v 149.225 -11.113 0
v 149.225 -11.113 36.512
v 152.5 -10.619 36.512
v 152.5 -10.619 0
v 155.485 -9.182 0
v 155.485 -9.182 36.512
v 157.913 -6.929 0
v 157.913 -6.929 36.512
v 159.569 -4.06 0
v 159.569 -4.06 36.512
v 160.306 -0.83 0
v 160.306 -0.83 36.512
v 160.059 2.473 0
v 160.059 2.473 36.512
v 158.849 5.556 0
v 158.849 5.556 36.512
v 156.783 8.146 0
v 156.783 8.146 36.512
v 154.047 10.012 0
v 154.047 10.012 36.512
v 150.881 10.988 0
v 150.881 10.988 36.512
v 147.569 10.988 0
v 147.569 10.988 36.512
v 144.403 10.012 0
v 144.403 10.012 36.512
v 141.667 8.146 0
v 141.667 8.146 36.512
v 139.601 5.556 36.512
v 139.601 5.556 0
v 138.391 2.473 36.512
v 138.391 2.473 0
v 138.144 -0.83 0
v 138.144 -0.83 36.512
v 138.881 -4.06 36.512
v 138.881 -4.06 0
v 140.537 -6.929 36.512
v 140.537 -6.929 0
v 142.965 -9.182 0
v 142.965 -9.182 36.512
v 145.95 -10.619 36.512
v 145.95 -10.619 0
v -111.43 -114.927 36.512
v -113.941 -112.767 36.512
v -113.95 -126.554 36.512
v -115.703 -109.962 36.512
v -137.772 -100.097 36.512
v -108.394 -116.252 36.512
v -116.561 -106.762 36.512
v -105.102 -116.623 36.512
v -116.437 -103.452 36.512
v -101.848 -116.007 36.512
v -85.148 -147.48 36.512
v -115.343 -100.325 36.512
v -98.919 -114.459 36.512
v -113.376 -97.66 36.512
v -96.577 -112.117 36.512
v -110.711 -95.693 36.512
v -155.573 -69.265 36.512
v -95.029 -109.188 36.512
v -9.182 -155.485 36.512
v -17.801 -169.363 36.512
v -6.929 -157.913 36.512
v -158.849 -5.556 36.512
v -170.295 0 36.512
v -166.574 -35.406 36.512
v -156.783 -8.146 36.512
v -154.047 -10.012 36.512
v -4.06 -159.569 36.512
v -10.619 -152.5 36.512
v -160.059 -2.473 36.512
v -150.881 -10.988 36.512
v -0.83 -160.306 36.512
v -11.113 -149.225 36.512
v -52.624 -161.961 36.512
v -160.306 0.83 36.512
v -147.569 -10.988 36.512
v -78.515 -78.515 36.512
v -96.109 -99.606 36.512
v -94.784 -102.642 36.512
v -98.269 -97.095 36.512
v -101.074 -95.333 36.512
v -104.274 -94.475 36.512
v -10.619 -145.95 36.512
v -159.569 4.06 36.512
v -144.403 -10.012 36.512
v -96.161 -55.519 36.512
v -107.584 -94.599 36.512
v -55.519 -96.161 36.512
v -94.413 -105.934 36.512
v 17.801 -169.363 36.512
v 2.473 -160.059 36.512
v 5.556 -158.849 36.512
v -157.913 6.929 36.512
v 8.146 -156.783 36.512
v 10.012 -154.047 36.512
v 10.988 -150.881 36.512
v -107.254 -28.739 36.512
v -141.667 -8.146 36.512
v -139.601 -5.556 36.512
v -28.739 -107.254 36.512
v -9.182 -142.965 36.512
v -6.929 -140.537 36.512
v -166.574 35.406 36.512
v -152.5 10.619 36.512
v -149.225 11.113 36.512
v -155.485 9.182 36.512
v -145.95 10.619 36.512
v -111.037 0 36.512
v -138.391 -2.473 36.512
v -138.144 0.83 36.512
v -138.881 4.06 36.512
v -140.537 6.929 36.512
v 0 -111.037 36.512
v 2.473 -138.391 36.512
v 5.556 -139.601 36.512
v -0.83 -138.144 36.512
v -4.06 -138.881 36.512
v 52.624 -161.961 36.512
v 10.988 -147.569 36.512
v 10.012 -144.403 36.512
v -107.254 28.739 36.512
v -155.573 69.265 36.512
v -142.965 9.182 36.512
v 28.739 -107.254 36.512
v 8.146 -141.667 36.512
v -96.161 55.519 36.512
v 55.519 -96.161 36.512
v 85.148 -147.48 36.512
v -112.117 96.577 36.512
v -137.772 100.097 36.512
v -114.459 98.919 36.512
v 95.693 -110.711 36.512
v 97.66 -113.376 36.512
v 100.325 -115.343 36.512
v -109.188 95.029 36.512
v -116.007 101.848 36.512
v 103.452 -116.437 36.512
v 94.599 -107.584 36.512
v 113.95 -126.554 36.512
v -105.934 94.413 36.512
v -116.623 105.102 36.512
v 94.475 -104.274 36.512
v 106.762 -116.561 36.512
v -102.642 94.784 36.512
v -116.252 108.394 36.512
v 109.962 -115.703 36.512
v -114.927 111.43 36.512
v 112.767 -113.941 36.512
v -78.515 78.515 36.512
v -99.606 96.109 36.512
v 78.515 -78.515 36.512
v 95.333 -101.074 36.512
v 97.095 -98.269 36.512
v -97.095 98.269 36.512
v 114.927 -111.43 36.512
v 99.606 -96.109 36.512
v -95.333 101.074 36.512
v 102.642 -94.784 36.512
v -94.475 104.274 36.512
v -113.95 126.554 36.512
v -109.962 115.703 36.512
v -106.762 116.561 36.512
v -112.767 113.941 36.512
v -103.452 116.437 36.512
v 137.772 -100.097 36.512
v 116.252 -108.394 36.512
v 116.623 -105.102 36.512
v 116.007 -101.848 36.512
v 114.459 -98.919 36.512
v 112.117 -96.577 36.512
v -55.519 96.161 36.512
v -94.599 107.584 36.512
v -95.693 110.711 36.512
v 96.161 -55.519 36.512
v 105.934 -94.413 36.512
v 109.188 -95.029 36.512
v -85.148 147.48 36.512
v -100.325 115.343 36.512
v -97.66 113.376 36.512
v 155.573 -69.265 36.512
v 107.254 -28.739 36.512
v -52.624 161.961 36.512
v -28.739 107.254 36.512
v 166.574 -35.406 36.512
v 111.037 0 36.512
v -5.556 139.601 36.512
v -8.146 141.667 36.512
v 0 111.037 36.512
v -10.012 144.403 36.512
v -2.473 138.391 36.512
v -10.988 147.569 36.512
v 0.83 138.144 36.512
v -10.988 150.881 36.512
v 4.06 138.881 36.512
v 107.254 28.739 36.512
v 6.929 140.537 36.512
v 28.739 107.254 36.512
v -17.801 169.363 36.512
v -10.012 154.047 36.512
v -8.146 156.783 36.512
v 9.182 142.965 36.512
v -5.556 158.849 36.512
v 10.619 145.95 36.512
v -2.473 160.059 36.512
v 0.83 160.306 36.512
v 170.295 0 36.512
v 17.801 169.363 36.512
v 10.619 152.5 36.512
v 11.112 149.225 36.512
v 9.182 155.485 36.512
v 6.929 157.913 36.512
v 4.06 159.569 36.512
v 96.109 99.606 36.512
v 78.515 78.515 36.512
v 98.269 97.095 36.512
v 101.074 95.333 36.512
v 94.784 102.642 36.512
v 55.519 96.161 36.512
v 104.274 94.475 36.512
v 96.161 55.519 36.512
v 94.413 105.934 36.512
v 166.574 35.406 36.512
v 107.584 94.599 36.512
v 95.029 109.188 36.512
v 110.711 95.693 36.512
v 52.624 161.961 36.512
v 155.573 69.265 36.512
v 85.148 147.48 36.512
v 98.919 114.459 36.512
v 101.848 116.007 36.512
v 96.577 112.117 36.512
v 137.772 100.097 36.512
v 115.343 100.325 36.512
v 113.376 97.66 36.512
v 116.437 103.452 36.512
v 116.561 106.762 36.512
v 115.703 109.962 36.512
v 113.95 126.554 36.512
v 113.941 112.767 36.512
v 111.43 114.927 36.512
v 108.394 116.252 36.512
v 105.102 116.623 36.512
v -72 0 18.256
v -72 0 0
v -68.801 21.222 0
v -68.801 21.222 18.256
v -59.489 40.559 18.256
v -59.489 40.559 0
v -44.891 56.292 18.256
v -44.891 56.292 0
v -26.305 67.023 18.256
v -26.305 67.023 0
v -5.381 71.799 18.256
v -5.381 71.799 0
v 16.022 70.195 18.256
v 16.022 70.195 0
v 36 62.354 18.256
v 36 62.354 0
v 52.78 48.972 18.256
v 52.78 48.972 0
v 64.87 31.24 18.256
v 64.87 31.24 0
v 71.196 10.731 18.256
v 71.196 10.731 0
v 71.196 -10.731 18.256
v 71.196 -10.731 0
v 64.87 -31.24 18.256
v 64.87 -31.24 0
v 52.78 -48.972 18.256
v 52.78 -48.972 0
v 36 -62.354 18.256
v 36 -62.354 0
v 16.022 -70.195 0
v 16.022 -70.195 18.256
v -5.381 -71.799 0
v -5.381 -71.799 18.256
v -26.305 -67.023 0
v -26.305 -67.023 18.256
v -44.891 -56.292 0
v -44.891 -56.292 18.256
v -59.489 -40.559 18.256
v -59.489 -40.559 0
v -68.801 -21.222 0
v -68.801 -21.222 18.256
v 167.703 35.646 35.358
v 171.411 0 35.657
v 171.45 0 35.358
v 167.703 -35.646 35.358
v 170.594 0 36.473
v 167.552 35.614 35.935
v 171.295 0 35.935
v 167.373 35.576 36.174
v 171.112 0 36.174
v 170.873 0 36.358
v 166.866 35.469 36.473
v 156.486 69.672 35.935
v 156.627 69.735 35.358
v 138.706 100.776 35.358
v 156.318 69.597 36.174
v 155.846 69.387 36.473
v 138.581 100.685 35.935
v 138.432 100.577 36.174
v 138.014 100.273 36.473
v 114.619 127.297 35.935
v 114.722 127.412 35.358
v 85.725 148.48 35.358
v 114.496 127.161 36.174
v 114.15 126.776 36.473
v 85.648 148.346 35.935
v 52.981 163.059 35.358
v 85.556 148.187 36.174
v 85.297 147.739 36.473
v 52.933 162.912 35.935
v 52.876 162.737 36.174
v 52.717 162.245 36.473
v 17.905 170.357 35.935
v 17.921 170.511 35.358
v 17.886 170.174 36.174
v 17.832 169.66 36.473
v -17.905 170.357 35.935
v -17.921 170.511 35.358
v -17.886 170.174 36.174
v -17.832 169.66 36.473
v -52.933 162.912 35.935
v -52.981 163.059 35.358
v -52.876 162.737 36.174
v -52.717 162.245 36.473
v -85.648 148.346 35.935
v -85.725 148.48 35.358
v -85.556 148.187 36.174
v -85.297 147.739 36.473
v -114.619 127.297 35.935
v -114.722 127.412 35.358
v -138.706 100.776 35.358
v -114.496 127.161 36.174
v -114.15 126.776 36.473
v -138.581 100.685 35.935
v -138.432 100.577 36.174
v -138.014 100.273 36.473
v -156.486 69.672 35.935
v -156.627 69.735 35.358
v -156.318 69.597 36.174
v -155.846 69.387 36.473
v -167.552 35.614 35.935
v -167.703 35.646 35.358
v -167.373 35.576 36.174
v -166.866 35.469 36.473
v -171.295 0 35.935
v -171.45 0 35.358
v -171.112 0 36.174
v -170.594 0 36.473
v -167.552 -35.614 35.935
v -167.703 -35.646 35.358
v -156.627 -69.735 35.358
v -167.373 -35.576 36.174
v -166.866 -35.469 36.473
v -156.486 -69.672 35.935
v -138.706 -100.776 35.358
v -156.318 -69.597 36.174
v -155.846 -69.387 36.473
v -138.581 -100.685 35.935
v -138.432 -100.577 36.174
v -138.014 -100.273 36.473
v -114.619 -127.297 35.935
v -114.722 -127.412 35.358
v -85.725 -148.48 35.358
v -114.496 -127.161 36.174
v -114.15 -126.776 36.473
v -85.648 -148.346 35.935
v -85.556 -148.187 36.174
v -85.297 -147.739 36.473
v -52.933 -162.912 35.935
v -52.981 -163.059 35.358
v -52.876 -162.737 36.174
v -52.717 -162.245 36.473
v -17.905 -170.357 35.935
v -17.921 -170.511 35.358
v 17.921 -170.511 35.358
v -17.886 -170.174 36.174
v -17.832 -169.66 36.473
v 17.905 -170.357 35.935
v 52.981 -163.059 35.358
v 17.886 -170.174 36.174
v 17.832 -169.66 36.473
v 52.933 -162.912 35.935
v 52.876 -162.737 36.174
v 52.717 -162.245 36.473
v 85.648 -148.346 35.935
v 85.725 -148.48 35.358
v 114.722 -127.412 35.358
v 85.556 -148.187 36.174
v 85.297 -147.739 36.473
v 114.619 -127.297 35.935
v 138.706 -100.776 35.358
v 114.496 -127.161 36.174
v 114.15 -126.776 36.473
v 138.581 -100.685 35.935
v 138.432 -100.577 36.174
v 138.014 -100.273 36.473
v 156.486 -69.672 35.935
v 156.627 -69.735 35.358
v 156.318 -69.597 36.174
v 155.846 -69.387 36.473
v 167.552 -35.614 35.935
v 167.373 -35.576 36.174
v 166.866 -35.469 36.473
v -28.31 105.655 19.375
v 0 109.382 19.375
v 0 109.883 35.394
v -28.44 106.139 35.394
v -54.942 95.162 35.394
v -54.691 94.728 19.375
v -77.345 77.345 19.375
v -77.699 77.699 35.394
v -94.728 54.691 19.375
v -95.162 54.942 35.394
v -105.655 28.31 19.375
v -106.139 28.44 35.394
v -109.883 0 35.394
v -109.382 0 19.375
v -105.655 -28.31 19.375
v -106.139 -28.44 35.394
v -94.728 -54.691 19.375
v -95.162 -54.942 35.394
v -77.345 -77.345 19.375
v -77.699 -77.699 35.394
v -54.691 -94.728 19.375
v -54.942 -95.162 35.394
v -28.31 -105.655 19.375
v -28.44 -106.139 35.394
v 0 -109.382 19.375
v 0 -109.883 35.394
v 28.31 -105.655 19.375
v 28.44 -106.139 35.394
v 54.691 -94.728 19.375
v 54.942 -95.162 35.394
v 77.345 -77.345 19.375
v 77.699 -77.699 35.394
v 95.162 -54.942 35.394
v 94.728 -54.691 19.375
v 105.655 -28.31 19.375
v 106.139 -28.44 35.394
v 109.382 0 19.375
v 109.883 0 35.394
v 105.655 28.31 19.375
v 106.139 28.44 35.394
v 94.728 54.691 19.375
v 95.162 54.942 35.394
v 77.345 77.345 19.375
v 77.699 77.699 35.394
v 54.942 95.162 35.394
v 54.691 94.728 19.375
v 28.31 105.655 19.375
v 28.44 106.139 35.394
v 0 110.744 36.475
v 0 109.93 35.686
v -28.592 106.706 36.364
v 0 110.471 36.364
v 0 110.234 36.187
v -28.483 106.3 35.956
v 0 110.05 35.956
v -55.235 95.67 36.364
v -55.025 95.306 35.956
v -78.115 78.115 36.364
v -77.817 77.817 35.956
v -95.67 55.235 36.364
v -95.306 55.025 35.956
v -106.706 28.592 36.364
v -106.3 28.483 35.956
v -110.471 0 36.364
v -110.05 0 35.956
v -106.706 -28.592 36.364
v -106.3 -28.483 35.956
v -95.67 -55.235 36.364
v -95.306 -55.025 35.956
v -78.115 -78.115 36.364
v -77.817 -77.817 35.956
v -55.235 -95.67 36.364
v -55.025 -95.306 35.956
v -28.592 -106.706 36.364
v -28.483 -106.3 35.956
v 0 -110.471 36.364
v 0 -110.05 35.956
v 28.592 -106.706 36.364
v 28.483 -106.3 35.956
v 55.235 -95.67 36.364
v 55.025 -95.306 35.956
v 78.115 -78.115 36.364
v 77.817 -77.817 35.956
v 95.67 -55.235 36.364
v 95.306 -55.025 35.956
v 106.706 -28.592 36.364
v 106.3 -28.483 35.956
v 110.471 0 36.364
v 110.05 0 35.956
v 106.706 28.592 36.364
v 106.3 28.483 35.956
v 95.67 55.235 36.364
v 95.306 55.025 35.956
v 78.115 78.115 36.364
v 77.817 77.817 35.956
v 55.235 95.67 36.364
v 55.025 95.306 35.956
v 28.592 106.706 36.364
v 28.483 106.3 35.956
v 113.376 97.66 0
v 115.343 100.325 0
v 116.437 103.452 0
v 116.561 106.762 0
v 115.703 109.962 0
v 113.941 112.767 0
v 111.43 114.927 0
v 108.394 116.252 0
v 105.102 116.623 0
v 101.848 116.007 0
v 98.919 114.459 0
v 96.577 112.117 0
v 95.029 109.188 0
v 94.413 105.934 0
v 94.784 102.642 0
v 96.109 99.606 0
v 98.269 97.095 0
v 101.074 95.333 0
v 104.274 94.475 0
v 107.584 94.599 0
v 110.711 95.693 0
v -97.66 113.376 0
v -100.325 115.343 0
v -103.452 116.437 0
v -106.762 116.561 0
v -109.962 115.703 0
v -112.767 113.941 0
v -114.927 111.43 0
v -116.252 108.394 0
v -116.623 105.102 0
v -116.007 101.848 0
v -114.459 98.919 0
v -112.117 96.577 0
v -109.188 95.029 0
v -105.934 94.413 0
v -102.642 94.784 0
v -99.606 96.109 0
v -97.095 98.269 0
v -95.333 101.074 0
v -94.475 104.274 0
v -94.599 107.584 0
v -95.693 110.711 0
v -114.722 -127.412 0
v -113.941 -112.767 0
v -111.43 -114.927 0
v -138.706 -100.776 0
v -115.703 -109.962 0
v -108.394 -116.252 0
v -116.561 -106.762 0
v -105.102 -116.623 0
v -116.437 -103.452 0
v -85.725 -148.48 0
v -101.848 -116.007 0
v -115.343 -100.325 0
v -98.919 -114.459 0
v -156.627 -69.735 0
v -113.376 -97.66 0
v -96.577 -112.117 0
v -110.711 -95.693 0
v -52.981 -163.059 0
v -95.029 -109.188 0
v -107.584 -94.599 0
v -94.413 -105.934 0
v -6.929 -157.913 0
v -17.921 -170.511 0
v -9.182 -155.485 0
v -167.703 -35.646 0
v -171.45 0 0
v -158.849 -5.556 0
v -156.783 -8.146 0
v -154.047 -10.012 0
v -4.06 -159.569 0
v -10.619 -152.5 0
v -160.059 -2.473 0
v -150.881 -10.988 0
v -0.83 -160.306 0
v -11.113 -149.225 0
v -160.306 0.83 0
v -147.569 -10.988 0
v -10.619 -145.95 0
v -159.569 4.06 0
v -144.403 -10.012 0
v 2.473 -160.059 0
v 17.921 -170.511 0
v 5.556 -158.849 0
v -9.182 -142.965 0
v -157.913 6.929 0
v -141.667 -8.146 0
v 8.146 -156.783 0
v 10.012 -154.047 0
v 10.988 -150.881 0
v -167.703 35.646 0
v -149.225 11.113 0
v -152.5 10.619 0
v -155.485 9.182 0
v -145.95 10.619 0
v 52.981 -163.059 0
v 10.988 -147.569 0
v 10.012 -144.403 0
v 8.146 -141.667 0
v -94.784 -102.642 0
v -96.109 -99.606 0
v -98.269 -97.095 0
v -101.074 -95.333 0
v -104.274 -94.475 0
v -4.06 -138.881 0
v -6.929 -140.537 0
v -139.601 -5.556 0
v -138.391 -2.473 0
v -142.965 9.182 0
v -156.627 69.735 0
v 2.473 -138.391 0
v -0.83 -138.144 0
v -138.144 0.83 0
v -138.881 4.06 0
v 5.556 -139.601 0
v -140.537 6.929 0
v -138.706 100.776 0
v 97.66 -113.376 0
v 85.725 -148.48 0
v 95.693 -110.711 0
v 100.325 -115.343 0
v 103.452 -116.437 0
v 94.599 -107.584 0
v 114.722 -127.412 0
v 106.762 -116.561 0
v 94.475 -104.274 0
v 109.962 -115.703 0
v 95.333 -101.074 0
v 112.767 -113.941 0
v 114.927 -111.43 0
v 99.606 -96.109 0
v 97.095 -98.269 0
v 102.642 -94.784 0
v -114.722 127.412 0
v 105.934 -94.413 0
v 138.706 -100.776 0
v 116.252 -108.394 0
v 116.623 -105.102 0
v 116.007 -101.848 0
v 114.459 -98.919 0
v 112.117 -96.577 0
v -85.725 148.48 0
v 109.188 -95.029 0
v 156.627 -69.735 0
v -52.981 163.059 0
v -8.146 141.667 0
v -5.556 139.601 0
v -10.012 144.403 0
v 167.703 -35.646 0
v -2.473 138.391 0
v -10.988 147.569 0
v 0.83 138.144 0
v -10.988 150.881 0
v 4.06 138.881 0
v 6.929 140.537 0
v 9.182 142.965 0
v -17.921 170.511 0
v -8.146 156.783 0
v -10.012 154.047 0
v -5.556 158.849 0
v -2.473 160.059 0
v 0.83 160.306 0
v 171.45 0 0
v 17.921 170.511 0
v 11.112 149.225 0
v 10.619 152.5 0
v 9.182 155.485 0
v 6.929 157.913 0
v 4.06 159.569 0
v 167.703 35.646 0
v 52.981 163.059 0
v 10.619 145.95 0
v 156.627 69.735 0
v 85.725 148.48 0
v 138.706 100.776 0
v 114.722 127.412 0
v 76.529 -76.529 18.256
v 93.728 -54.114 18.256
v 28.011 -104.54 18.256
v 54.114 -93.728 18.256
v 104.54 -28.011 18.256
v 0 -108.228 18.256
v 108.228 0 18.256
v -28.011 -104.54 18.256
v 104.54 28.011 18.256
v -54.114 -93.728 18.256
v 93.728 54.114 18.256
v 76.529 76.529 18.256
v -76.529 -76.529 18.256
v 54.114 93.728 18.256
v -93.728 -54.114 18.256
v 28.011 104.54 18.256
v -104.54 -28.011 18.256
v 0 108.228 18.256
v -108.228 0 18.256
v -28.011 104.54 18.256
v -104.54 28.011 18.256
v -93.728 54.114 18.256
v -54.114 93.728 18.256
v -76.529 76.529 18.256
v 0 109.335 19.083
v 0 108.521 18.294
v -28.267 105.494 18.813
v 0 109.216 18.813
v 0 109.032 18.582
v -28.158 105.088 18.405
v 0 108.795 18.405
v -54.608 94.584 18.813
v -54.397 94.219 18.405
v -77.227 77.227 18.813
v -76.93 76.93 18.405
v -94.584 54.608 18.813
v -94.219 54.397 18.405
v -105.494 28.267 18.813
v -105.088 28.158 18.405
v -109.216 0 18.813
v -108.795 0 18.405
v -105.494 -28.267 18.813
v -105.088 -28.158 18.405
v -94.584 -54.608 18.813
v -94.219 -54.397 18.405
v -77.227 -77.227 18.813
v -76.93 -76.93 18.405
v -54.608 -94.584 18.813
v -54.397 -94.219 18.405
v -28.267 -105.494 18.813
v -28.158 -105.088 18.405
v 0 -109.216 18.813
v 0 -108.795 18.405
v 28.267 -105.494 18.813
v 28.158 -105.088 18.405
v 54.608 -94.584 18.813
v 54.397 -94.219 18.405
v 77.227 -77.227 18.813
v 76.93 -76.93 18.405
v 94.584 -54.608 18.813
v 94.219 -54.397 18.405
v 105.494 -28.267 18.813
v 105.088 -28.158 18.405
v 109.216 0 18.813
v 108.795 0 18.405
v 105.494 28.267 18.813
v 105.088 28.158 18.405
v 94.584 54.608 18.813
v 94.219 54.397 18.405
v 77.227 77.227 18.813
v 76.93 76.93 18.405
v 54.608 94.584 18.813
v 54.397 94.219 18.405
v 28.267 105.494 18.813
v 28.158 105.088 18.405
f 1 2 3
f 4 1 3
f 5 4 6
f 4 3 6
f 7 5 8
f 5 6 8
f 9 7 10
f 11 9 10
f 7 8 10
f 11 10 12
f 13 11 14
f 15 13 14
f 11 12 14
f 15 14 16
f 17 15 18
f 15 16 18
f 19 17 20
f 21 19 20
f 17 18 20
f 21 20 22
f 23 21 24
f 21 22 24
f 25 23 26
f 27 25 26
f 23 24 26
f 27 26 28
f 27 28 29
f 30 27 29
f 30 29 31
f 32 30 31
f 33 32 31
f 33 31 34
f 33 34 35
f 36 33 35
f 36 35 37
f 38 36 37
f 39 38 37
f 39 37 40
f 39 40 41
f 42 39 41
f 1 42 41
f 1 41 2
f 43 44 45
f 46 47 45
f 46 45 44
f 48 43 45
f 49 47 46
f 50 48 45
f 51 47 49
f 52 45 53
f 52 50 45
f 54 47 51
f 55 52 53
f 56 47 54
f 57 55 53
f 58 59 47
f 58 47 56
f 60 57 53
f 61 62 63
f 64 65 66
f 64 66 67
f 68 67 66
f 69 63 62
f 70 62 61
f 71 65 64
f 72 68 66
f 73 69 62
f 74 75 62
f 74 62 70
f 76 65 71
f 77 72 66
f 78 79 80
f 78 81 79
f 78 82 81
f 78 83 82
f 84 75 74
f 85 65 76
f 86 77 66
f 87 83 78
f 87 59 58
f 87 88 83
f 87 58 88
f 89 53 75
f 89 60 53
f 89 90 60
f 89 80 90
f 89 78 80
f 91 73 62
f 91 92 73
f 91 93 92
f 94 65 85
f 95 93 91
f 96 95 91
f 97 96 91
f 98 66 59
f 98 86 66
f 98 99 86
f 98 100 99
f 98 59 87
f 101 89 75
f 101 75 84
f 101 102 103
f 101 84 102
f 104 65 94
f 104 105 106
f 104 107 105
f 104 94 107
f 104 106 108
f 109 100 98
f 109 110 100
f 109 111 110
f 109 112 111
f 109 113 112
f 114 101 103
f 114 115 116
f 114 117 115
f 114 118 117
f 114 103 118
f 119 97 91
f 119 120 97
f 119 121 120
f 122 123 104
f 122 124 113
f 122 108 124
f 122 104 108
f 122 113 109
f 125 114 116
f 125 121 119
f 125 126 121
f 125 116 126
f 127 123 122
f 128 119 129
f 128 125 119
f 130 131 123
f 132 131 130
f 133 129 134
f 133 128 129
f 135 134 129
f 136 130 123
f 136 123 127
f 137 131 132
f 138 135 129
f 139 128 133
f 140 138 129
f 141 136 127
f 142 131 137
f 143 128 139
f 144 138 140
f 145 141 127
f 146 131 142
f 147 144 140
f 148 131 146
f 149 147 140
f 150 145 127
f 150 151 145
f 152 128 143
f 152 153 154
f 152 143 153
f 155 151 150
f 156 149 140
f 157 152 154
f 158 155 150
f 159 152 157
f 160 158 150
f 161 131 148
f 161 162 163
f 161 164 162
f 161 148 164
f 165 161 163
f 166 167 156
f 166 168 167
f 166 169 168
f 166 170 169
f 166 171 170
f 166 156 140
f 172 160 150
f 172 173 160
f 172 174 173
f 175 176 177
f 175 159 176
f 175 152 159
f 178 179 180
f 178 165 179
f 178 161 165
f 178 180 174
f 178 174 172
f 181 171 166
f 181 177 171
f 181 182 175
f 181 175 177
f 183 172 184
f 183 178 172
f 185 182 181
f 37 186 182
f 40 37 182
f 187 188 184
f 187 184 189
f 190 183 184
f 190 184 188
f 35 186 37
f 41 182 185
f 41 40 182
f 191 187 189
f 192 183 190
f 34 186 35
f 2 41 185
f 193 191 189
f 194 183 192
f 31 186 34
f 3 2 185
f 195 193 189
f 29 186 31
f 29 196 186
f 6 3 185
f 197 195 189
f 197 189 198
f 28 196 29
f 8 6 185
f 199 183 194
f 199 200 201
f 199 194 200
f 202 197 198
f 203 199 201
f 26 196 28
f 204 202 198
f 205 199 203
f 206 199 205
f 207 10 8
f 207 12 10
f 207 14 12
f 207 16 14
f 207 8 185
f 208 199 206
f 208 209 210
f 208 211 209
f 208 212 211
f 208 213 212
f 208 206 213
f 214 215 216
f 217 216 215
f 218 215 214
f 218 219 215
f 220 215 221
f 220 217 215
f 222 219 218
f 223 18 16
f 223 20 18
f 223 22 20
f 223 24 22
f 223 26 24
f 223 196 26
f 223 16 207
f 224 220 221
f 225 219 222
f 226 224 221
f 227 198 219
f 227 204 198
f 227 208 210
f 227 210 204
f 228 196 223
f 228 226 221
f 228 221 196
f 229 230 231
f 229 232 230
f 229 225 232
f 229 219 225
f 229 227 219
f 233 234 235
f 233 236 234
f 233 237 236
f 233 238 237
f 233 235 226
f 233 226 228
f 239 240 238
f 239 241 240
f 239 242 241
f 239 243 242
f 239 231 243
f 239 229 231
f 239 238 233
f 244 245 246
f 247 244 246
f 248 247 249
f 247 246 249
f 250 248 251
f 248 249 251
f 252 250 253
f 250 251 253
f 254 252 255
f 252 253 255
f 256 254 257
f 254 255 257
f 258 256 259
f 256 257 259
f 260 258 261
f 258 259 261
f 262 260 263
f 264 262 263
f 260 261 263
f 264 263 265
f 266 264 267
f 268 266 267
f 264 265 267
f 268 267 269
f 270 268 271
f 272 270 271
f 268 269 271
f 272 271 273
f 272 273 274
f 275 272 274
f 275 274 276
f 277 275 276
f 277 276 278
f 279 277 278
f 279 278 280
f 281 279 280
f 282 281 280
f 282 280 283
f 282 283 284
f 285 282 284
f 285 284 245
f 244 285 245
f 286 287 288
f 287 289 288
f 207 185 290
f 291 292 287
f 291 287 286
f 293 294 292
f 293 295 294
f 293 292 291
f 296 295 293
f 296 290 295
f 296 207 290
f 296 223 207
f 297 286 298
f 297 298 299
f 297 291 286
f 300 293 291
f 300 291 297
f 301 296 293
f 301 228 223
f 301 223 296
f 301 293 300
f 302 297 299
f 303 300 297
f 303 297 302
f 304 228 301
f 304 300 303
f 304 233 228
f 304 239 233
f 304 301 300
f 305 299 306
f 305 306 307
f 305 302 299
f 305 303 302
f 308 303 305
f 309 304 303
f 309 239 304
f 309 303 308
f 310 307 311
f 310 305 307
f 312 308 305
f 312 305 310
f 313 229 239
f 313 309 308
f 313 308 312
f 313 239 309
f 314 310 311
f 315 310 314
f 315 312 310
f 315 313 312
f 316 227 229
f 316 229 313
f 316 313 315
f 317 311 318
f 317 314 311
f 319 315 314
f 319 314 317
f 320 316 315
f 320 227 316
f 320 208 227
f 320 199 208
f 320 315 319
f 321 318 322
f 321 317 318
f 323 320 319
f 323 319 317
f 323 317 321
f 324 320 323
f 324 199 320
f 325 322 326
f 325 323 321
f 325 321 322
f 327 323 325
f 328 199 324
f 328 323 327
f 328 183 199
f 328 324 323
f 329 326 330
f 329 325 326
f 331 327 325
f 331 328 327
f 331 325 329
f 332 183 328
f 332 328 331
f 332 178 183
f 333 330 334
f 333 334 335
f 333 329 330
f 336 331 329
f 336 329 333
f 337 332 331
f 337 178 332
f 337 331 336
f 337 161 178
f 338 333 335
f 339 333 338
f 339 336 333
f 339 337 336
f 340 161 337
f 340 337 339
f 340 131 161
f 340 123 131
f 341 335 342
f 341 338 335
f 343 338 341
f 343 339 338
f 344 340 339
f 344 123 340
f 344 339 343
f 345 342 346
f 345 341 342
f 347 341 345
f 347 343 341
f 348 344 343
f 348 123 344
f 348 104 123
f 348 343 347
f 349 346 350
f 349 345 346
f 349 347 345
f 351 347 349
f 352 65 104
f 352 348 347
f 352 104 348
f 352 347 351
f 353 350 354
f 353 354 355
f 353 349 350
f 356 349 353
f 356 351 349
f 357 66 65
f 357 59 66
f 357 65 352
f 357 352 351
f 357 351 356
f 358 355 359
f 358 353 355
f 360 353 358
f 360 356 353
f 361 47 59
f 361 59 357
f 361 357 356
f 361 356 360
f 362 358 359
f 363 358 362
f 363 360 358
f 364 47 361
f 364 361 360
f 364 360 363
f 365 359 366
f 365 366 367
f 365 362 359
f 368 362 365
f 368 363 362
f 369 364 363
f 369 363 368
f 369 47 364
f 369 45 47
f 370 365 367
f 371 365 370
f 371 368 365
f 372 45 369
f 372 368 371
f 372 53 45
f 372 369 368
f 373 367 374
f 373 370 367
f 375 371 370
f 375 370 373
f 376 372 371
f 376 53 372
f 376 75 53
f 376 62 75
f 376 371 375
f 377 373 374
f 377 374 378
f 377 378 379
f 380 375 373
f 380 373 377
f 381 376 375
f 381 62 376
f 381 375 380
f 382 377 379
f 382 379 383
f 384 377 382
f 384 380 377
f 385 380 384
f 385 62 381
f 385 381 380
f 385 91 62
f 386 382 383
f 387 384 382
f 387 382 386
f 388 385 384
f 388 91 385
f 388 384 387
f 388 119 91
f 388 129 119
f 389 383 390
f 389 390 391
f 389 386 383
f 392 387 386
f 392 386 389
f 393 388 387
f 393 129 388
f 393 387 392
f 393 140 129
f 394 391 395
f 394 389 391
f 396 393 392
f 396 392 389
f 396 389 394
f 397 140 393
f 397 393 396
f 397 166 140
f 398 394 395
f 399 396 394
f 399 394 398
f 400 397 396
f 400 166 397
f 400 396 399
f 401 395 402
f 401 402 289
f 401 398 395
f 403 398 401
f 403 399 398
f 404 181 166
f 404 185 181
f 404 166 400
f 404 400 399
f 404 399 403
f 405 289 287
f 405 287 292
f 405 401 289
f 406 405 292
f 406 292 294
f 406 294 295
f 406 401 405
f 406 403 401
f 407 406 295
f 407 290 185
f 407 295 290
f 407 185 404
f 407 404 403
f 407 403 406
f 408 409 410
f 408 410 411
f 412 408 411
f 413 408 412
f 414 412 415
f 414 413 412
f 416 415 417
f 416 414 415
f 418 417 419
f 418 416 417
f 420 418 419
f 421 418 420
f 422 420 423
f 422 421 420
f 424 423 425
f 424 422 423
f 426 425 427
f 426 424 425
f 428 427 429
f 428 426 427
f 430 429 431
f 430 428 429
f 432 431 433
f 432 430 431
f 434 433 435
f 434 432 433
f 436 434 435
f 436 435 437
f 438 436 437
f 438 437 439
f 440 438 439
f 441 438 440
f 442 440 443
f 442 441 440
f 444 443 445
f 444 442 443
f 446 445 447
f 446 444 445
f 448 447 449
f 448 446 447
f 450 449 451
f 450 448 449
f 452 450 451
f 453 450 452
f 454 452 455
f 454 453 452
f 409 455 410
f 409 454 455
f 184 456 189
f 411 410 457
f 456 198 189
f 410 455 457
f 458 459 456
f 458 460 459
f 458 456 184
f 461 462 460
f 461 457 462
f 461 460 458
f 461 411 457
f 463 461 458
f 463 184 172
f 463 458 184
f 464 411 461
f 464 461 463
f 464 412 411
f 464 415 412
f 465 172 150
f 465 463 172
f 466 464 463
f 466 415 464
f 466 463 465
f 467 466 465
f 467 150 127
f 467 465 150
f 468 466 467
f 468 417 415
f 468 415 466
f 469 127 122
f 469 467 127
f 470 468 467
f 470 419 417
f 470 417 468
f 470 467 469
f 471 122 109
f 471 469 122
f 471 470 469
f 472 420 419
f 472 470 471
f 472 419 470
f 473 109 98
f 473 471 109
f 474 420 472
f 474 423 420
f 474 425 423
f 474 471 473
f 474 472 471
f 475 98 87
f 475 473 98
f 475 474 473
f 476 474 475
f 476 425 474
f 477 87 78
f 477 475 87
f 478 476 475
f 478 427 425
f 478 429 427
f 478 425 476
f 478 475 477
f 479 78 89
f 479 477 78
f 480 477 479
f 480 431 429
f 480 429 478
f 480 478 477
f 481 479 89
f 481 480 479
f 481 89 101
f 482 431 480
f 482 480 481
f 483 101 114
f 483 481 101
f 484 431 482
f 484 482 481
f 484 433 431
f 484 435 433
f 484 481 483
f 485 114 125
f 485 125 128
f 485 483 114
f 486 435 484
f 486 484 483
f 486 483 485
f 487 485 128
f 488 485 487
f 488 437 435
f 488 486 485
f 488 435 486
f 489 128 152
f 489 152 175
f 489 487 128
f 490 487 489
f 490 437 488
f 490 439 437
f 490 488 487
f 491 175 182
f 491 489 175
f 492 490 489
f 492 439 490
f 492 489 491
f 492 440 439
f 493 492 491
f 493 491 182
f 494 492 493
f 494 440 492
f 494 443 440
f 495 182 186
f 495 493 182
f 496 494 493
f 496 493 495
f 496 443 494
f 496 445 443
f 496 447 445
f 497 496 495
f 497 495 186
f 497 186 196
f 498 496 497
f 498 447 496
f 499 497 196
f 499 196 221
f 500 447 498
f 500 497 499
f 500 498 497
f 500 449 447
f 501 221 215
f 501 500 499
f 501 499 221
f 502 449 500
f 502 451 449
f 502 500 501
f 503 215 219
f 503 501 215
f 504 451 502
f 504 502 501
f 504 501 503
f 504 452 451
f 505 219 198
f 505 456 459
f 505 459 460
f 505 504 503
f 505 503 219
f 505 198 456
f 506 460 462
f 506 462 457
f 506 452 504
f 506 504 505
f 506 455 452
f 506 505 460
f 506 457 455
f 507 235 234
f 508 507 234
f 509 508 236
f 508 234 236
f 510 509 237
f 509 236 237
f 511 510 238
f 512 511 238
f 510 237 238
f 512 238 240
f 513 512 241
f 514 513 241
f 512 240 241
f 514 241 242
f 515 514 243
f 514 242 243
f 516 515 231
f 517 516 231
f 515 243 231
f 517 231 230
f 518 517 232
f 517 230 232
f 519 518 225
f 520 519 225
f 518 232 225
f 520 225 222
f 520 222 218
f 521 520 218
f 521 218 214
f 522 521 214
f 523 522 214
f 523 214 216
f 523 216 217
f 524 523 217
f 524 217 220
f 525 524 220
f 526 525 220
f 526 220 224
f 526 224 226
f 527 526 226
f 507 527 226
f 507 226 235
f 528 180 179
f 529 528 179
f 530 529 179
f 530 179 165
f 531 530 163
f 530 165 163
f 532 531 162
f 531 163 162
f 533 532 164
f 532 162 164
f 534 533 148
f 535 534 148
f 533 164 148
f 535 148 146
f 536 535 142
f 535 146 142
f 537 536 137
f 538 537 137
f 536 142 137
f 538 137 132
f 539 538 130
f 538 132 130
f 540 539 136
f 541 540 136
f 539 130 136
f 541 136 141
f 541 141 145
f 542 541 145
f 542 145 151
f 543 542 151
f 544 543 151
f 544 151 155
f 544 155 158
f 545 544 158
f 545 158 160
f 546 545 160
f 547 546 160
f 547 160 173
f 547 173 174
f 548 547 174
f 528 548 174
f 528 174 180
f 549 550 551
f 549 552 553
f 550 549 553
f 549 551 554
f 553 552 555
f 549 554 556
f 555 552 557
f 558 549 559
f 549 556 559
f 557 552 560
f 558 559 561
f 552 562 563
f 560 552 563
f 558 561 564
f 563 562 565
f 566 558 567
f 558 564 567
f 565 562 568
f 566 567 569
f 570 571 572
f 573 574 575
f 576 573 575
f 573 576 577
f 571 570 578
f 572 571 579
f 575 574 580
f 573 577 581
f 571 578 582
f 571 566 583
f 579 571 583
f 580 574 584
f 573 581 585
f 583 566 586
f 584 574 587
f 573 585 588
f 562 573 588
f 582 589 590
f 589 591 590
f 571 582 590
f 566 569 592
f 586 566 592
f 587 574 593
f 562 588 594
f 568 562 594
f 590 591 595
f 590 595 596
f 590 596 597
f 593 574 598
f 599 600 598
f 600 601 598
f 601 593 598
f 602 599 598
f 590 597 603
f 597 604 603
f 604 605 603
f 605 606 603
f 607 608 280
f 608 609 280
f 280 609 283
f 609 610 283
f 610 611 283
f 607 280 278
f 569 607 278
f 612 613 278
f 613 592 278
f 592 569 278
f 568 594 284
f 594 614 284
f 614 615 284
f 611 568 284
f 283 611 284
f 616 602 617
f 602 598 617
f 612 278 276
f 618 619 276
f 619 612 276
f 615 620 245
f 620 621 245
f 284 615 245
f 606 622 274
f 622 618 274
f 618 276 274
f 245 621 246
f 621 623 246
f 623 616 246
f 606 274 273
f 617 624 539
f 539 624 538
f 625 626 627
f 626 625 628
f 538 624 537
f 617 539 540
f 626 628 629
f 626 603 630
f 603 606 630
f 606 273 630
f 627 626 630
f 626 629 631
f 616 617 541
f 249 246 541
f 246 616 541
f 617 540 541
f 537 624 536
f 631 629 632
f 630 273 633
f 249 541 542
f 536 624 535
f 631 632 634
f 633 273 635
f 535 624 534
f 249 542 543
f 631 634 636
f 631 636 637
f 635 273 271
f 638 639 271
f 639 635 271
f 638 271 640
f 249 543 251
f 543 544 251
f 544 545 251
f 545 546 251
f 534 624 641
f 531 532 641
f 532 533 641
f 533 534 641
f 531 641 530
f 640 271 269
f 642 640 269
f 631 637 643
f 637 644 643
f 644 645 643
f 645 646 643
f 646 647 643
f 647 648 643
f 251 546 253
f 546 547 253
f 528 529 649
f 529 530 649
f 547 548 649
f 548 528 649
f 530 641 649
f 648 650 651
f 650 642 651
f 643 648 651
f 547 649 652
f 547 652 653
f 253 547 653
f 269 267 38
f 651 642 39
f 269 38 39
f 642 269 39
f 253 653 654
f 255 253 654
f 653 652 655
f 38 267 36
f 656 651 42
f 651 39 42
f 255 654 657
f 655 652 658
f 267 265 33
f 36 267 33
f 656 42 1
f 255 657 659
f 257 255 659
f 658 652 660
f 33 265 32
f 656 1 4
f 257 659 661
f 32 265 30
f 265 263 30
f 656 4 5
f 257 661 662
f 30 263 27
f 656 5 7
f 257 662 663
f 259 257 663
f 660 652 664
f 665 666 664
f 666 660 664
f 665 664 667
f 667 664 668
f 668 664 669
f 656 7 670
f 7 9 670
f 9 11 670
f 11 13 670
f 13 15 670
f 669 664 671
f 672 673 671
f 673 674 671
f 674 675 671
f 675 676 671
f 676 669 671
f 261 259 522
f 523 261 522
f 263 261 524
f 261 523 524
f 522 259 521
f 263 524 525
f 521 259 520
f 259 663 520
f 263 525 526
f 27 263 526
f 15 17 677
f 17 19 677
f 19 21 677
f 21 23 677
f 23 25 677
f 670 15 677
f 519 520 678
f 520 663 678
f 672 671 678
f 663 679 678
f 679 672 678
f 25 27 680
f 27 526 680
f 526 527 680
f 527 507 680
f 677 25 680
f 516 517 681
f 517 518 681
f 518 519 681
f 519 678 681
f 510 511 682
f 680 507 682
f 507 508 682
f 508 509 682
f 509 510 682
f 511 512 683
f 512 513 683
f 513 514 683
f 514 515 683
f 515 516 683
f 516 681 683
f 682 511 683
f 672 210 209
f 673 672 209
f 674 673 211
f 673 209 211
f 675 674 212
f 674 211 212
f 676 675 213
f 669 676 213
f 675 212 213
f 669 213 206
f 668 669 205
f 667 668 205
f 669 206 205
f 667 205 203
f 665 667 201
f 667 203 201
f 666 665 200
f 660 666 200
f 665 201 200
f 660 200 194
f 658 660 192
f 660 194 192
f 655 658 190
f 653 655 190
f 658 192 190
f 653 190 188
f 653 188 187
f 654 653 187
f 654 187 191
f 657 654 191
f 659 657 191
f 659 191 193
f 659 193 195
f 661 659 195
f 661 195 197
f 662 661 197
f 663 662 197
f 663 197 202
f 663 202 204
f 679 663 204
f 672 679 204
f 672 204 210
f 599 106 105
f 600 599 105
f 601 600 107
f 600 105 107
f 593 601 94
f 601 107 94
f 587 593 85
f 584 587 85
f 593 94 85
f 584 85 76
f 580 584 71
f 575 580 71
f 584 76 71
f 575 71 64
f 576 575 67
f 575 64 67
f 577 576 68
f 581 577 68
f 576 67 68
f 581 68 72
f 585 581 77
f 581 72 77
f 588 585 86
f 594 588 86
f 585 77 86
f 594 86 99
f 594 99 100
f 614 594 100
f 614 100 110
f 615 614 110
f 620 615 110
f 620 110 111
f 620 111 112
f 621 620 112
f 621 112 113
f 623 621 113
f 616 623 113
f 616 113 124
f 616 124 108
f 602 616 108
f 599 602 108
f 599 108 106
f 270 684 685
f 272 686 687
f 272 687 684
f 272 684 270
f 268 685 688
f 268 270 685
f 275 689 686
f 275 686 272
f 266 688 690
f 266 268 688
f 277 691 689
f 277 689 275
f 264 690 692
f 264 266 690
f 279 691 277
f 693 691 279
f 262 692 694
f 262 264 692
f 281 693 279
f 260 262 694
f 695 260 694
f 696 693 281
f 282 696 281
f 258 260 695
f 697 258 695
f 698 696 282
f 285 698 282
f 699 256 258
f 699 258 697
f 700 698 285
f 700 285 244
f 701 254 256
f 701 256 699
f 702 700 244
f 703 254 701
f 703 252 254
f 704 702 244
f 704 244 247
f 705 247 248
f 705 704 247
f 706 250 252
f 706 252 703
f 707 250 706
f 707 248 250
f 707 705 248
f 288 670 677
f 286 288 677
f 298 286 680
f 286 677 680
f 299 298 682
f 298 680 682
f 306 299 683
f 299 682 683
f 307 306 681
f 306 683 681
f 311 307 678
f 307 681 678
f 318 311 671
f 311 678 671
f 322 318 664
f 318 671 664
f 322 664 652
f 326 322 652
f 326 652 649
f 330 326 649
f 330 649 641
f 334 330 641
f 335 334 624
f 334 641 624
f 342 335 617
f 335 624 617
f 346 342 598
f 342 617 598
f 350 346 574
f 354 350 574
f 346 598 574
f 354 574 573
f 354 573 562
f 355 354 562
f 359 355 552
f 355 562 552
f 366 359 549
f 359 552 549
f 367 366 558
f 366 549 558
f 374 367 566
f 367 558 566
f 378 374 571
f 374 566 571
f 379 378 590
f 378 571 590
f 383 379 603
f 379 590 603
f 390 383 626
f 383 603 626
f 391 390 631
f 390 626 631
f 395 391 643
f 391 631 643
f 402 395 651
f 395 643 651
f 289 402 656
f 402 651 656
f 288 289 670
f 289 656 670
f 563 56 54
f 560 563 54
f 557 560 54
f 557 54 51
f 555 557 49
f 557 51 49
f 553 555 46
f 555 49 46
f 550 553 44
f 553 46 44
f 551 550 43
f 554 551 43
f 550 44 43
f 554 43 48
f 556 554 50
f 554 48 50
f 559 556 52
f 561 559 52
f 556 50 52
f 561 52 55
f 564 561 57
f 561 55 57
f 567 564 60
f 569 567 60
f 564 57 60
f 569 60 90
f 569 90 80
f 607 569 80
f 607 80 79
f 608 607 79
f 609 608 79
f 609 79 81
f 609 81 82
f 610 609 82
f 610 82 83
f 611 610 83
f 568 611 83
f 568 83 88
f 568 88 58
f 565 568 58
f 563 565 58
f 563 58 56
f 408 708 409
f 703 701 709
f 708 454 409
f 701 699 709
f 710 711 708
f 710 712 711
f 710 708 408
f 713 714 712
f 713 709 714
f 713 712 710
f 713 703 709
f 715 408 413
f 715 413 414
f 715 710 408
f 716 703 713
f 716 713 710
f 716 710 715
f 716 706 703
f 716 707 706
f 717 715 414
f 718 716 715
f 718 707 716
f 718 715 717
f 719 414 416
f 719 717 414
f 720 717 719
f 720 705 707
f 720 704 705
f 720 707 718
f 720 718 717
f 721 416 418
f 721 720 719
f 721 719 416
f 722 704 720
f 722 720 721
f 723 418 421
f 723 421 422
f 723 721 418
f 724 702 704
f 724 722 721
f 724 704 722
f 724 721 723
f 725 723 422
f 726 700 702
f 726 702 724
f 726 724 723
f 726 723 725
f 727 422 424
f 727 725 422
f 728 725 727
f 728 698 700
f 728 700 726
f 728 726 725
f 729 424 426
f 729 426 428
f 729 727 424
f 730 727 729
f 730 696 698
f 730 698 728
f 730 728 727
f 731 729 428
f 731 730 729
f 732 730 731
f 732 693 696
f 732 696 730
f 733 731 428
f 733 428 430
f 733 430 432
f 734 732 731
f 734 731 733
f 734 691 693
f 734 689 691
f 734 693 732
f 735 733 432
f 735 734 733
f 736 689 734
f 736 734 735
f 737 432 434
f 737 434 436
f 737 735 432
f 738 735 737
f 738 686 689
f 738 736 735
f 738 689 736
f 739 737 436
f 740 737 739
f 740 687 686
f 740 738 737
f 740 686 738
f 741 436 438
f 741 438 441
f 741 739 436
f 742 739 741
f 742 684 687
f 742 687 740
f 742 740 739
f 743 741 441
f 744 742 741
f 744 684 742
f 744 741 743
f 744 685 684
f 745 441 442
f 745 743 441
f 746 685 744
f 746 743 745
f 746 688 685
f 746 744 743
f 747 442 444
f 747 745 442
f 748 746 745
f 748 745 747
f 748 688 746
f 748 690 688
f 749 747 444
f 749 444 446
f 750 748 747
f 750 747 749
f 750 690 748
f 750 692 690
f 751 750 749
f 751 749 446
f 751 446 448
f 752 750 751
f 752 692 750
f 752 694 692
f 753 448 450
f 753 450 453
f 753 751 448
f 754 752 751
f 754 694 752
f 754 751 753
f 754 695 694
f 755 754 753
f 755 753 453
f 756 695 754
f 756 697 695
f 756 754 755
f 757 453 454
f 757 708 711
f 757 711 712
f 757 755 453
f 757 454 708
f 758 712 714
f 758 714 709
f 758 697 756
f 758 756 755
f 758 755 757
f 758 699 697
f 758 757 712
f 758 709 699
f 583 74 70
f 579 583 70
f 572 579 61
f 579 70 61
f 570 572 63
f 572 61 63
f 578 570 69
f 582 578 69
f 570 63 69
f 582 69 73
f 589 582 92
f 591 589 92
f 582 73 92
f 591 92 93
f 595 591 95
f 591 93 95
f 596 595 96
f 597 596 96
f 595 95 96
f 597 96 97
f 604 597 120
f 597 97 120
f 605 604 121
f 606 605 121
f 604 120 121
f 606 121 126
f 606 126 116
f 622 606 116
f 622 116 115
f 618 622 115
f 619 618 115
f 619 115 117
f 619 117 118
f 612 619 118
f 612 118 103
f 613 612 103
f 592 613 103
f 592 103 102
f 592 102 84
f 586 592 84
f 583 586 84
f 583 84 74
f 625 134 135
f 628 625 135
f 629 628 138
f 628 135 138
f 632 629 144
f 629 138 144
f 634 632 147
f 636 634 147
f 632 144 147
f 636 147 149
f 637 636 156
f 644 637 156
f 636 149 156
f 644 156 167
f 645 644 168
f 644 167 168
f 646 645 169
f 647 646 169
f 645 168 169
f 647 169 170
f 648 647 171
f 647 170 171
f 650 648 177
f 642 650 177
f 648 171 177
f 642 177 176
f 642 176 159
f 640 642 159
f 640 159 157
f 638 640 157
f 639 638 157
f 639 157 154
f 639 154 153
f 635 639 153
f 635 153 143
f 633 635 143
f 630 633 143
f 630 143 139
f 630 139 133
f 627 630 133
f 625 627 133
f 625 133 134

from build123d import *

# Parameters (mm, degrees)
SKETCH1_R          = 171.45
EXTRUDE1_DEPTH     = 36.5125
SKETCH2_R          = 11.1125
EXTRUDE2_DEPTH     = 246.20066814
CIRPATTERN1_COUNT  = 8
FILLET1_R          = 1.154545455
SKETCH5_R          = 72
CUT_EXTRUDE1_DEPTH = 237.236


with BuildPart() as part:
    # Sketch1 → Extrude1 (new body)
    with BuildSketch(Plane.XY):
        Circle(SKETCH1_R)
    extrude(amount=EXTRUDE1_DEPTH)

    # Sketch2 → Extrude2 (cut, through all)
    with BuildSketch(Plane.XY.offset(36.5125)):
        with Locations((0, 149.225)):
            Circle(SKETCH2_R)
    extrude2 = extrude(amount=-EXTRUDE2_DEPTH, mode=Mode.SUBTRACT)

    # CirPattern1: Extrude2 ×8 about axis
    cirpattern1_axis = Axis((0, 0, 0), (0, 0, 1))
    for i in range(1, CIRPATTERN1_COUNT):
        add(extrude2.rotate(cirpattern1_axis, i * 360 / CIRPATTERN1_COUNT), mode=Mode.SUBTRACT)

    # Sketch3 → Cut-Revolve1 (revolve, cut)
    with BuildSketch(Plane(origin=(0, 0, 0), x_dir=(0, 0, -1), z_dir=(1, 0, 0))):
        Polygon((-36.5125, 109.9185), (-18.25625, 109.347), (-18.25625, 0), (-36.5125, 0), align=None)
    revolve(axis=Axis((0, 0, 18.25625), (0, 0, 1)), mode=Mode.SUBTRACT)

    # Fillet1
    fillet1_edges = [part.edges().sort_by_distance(p)[0] for p in [
        (0, -109.347, 18.25625),
        (0, -109.9185, 36.5125),
        (-171.45, 0, 36.5125),
    ]]
    fillet(fillet1_edges, radius=FILLET1_R)

    # Sketch5 → Cut-Extrude1 (cut)
    with BuildSketch(Plane(origin=(0, 0, 0), x_dir=(-1, 0, 0), z_dir=(0, 0, -1))):
        Circle(SKETCH5_R)
    extrude(amount=-CUT_EXTRUDE1_DEPTH, mode=Mode.SUBTRACT)


solid = part.part
